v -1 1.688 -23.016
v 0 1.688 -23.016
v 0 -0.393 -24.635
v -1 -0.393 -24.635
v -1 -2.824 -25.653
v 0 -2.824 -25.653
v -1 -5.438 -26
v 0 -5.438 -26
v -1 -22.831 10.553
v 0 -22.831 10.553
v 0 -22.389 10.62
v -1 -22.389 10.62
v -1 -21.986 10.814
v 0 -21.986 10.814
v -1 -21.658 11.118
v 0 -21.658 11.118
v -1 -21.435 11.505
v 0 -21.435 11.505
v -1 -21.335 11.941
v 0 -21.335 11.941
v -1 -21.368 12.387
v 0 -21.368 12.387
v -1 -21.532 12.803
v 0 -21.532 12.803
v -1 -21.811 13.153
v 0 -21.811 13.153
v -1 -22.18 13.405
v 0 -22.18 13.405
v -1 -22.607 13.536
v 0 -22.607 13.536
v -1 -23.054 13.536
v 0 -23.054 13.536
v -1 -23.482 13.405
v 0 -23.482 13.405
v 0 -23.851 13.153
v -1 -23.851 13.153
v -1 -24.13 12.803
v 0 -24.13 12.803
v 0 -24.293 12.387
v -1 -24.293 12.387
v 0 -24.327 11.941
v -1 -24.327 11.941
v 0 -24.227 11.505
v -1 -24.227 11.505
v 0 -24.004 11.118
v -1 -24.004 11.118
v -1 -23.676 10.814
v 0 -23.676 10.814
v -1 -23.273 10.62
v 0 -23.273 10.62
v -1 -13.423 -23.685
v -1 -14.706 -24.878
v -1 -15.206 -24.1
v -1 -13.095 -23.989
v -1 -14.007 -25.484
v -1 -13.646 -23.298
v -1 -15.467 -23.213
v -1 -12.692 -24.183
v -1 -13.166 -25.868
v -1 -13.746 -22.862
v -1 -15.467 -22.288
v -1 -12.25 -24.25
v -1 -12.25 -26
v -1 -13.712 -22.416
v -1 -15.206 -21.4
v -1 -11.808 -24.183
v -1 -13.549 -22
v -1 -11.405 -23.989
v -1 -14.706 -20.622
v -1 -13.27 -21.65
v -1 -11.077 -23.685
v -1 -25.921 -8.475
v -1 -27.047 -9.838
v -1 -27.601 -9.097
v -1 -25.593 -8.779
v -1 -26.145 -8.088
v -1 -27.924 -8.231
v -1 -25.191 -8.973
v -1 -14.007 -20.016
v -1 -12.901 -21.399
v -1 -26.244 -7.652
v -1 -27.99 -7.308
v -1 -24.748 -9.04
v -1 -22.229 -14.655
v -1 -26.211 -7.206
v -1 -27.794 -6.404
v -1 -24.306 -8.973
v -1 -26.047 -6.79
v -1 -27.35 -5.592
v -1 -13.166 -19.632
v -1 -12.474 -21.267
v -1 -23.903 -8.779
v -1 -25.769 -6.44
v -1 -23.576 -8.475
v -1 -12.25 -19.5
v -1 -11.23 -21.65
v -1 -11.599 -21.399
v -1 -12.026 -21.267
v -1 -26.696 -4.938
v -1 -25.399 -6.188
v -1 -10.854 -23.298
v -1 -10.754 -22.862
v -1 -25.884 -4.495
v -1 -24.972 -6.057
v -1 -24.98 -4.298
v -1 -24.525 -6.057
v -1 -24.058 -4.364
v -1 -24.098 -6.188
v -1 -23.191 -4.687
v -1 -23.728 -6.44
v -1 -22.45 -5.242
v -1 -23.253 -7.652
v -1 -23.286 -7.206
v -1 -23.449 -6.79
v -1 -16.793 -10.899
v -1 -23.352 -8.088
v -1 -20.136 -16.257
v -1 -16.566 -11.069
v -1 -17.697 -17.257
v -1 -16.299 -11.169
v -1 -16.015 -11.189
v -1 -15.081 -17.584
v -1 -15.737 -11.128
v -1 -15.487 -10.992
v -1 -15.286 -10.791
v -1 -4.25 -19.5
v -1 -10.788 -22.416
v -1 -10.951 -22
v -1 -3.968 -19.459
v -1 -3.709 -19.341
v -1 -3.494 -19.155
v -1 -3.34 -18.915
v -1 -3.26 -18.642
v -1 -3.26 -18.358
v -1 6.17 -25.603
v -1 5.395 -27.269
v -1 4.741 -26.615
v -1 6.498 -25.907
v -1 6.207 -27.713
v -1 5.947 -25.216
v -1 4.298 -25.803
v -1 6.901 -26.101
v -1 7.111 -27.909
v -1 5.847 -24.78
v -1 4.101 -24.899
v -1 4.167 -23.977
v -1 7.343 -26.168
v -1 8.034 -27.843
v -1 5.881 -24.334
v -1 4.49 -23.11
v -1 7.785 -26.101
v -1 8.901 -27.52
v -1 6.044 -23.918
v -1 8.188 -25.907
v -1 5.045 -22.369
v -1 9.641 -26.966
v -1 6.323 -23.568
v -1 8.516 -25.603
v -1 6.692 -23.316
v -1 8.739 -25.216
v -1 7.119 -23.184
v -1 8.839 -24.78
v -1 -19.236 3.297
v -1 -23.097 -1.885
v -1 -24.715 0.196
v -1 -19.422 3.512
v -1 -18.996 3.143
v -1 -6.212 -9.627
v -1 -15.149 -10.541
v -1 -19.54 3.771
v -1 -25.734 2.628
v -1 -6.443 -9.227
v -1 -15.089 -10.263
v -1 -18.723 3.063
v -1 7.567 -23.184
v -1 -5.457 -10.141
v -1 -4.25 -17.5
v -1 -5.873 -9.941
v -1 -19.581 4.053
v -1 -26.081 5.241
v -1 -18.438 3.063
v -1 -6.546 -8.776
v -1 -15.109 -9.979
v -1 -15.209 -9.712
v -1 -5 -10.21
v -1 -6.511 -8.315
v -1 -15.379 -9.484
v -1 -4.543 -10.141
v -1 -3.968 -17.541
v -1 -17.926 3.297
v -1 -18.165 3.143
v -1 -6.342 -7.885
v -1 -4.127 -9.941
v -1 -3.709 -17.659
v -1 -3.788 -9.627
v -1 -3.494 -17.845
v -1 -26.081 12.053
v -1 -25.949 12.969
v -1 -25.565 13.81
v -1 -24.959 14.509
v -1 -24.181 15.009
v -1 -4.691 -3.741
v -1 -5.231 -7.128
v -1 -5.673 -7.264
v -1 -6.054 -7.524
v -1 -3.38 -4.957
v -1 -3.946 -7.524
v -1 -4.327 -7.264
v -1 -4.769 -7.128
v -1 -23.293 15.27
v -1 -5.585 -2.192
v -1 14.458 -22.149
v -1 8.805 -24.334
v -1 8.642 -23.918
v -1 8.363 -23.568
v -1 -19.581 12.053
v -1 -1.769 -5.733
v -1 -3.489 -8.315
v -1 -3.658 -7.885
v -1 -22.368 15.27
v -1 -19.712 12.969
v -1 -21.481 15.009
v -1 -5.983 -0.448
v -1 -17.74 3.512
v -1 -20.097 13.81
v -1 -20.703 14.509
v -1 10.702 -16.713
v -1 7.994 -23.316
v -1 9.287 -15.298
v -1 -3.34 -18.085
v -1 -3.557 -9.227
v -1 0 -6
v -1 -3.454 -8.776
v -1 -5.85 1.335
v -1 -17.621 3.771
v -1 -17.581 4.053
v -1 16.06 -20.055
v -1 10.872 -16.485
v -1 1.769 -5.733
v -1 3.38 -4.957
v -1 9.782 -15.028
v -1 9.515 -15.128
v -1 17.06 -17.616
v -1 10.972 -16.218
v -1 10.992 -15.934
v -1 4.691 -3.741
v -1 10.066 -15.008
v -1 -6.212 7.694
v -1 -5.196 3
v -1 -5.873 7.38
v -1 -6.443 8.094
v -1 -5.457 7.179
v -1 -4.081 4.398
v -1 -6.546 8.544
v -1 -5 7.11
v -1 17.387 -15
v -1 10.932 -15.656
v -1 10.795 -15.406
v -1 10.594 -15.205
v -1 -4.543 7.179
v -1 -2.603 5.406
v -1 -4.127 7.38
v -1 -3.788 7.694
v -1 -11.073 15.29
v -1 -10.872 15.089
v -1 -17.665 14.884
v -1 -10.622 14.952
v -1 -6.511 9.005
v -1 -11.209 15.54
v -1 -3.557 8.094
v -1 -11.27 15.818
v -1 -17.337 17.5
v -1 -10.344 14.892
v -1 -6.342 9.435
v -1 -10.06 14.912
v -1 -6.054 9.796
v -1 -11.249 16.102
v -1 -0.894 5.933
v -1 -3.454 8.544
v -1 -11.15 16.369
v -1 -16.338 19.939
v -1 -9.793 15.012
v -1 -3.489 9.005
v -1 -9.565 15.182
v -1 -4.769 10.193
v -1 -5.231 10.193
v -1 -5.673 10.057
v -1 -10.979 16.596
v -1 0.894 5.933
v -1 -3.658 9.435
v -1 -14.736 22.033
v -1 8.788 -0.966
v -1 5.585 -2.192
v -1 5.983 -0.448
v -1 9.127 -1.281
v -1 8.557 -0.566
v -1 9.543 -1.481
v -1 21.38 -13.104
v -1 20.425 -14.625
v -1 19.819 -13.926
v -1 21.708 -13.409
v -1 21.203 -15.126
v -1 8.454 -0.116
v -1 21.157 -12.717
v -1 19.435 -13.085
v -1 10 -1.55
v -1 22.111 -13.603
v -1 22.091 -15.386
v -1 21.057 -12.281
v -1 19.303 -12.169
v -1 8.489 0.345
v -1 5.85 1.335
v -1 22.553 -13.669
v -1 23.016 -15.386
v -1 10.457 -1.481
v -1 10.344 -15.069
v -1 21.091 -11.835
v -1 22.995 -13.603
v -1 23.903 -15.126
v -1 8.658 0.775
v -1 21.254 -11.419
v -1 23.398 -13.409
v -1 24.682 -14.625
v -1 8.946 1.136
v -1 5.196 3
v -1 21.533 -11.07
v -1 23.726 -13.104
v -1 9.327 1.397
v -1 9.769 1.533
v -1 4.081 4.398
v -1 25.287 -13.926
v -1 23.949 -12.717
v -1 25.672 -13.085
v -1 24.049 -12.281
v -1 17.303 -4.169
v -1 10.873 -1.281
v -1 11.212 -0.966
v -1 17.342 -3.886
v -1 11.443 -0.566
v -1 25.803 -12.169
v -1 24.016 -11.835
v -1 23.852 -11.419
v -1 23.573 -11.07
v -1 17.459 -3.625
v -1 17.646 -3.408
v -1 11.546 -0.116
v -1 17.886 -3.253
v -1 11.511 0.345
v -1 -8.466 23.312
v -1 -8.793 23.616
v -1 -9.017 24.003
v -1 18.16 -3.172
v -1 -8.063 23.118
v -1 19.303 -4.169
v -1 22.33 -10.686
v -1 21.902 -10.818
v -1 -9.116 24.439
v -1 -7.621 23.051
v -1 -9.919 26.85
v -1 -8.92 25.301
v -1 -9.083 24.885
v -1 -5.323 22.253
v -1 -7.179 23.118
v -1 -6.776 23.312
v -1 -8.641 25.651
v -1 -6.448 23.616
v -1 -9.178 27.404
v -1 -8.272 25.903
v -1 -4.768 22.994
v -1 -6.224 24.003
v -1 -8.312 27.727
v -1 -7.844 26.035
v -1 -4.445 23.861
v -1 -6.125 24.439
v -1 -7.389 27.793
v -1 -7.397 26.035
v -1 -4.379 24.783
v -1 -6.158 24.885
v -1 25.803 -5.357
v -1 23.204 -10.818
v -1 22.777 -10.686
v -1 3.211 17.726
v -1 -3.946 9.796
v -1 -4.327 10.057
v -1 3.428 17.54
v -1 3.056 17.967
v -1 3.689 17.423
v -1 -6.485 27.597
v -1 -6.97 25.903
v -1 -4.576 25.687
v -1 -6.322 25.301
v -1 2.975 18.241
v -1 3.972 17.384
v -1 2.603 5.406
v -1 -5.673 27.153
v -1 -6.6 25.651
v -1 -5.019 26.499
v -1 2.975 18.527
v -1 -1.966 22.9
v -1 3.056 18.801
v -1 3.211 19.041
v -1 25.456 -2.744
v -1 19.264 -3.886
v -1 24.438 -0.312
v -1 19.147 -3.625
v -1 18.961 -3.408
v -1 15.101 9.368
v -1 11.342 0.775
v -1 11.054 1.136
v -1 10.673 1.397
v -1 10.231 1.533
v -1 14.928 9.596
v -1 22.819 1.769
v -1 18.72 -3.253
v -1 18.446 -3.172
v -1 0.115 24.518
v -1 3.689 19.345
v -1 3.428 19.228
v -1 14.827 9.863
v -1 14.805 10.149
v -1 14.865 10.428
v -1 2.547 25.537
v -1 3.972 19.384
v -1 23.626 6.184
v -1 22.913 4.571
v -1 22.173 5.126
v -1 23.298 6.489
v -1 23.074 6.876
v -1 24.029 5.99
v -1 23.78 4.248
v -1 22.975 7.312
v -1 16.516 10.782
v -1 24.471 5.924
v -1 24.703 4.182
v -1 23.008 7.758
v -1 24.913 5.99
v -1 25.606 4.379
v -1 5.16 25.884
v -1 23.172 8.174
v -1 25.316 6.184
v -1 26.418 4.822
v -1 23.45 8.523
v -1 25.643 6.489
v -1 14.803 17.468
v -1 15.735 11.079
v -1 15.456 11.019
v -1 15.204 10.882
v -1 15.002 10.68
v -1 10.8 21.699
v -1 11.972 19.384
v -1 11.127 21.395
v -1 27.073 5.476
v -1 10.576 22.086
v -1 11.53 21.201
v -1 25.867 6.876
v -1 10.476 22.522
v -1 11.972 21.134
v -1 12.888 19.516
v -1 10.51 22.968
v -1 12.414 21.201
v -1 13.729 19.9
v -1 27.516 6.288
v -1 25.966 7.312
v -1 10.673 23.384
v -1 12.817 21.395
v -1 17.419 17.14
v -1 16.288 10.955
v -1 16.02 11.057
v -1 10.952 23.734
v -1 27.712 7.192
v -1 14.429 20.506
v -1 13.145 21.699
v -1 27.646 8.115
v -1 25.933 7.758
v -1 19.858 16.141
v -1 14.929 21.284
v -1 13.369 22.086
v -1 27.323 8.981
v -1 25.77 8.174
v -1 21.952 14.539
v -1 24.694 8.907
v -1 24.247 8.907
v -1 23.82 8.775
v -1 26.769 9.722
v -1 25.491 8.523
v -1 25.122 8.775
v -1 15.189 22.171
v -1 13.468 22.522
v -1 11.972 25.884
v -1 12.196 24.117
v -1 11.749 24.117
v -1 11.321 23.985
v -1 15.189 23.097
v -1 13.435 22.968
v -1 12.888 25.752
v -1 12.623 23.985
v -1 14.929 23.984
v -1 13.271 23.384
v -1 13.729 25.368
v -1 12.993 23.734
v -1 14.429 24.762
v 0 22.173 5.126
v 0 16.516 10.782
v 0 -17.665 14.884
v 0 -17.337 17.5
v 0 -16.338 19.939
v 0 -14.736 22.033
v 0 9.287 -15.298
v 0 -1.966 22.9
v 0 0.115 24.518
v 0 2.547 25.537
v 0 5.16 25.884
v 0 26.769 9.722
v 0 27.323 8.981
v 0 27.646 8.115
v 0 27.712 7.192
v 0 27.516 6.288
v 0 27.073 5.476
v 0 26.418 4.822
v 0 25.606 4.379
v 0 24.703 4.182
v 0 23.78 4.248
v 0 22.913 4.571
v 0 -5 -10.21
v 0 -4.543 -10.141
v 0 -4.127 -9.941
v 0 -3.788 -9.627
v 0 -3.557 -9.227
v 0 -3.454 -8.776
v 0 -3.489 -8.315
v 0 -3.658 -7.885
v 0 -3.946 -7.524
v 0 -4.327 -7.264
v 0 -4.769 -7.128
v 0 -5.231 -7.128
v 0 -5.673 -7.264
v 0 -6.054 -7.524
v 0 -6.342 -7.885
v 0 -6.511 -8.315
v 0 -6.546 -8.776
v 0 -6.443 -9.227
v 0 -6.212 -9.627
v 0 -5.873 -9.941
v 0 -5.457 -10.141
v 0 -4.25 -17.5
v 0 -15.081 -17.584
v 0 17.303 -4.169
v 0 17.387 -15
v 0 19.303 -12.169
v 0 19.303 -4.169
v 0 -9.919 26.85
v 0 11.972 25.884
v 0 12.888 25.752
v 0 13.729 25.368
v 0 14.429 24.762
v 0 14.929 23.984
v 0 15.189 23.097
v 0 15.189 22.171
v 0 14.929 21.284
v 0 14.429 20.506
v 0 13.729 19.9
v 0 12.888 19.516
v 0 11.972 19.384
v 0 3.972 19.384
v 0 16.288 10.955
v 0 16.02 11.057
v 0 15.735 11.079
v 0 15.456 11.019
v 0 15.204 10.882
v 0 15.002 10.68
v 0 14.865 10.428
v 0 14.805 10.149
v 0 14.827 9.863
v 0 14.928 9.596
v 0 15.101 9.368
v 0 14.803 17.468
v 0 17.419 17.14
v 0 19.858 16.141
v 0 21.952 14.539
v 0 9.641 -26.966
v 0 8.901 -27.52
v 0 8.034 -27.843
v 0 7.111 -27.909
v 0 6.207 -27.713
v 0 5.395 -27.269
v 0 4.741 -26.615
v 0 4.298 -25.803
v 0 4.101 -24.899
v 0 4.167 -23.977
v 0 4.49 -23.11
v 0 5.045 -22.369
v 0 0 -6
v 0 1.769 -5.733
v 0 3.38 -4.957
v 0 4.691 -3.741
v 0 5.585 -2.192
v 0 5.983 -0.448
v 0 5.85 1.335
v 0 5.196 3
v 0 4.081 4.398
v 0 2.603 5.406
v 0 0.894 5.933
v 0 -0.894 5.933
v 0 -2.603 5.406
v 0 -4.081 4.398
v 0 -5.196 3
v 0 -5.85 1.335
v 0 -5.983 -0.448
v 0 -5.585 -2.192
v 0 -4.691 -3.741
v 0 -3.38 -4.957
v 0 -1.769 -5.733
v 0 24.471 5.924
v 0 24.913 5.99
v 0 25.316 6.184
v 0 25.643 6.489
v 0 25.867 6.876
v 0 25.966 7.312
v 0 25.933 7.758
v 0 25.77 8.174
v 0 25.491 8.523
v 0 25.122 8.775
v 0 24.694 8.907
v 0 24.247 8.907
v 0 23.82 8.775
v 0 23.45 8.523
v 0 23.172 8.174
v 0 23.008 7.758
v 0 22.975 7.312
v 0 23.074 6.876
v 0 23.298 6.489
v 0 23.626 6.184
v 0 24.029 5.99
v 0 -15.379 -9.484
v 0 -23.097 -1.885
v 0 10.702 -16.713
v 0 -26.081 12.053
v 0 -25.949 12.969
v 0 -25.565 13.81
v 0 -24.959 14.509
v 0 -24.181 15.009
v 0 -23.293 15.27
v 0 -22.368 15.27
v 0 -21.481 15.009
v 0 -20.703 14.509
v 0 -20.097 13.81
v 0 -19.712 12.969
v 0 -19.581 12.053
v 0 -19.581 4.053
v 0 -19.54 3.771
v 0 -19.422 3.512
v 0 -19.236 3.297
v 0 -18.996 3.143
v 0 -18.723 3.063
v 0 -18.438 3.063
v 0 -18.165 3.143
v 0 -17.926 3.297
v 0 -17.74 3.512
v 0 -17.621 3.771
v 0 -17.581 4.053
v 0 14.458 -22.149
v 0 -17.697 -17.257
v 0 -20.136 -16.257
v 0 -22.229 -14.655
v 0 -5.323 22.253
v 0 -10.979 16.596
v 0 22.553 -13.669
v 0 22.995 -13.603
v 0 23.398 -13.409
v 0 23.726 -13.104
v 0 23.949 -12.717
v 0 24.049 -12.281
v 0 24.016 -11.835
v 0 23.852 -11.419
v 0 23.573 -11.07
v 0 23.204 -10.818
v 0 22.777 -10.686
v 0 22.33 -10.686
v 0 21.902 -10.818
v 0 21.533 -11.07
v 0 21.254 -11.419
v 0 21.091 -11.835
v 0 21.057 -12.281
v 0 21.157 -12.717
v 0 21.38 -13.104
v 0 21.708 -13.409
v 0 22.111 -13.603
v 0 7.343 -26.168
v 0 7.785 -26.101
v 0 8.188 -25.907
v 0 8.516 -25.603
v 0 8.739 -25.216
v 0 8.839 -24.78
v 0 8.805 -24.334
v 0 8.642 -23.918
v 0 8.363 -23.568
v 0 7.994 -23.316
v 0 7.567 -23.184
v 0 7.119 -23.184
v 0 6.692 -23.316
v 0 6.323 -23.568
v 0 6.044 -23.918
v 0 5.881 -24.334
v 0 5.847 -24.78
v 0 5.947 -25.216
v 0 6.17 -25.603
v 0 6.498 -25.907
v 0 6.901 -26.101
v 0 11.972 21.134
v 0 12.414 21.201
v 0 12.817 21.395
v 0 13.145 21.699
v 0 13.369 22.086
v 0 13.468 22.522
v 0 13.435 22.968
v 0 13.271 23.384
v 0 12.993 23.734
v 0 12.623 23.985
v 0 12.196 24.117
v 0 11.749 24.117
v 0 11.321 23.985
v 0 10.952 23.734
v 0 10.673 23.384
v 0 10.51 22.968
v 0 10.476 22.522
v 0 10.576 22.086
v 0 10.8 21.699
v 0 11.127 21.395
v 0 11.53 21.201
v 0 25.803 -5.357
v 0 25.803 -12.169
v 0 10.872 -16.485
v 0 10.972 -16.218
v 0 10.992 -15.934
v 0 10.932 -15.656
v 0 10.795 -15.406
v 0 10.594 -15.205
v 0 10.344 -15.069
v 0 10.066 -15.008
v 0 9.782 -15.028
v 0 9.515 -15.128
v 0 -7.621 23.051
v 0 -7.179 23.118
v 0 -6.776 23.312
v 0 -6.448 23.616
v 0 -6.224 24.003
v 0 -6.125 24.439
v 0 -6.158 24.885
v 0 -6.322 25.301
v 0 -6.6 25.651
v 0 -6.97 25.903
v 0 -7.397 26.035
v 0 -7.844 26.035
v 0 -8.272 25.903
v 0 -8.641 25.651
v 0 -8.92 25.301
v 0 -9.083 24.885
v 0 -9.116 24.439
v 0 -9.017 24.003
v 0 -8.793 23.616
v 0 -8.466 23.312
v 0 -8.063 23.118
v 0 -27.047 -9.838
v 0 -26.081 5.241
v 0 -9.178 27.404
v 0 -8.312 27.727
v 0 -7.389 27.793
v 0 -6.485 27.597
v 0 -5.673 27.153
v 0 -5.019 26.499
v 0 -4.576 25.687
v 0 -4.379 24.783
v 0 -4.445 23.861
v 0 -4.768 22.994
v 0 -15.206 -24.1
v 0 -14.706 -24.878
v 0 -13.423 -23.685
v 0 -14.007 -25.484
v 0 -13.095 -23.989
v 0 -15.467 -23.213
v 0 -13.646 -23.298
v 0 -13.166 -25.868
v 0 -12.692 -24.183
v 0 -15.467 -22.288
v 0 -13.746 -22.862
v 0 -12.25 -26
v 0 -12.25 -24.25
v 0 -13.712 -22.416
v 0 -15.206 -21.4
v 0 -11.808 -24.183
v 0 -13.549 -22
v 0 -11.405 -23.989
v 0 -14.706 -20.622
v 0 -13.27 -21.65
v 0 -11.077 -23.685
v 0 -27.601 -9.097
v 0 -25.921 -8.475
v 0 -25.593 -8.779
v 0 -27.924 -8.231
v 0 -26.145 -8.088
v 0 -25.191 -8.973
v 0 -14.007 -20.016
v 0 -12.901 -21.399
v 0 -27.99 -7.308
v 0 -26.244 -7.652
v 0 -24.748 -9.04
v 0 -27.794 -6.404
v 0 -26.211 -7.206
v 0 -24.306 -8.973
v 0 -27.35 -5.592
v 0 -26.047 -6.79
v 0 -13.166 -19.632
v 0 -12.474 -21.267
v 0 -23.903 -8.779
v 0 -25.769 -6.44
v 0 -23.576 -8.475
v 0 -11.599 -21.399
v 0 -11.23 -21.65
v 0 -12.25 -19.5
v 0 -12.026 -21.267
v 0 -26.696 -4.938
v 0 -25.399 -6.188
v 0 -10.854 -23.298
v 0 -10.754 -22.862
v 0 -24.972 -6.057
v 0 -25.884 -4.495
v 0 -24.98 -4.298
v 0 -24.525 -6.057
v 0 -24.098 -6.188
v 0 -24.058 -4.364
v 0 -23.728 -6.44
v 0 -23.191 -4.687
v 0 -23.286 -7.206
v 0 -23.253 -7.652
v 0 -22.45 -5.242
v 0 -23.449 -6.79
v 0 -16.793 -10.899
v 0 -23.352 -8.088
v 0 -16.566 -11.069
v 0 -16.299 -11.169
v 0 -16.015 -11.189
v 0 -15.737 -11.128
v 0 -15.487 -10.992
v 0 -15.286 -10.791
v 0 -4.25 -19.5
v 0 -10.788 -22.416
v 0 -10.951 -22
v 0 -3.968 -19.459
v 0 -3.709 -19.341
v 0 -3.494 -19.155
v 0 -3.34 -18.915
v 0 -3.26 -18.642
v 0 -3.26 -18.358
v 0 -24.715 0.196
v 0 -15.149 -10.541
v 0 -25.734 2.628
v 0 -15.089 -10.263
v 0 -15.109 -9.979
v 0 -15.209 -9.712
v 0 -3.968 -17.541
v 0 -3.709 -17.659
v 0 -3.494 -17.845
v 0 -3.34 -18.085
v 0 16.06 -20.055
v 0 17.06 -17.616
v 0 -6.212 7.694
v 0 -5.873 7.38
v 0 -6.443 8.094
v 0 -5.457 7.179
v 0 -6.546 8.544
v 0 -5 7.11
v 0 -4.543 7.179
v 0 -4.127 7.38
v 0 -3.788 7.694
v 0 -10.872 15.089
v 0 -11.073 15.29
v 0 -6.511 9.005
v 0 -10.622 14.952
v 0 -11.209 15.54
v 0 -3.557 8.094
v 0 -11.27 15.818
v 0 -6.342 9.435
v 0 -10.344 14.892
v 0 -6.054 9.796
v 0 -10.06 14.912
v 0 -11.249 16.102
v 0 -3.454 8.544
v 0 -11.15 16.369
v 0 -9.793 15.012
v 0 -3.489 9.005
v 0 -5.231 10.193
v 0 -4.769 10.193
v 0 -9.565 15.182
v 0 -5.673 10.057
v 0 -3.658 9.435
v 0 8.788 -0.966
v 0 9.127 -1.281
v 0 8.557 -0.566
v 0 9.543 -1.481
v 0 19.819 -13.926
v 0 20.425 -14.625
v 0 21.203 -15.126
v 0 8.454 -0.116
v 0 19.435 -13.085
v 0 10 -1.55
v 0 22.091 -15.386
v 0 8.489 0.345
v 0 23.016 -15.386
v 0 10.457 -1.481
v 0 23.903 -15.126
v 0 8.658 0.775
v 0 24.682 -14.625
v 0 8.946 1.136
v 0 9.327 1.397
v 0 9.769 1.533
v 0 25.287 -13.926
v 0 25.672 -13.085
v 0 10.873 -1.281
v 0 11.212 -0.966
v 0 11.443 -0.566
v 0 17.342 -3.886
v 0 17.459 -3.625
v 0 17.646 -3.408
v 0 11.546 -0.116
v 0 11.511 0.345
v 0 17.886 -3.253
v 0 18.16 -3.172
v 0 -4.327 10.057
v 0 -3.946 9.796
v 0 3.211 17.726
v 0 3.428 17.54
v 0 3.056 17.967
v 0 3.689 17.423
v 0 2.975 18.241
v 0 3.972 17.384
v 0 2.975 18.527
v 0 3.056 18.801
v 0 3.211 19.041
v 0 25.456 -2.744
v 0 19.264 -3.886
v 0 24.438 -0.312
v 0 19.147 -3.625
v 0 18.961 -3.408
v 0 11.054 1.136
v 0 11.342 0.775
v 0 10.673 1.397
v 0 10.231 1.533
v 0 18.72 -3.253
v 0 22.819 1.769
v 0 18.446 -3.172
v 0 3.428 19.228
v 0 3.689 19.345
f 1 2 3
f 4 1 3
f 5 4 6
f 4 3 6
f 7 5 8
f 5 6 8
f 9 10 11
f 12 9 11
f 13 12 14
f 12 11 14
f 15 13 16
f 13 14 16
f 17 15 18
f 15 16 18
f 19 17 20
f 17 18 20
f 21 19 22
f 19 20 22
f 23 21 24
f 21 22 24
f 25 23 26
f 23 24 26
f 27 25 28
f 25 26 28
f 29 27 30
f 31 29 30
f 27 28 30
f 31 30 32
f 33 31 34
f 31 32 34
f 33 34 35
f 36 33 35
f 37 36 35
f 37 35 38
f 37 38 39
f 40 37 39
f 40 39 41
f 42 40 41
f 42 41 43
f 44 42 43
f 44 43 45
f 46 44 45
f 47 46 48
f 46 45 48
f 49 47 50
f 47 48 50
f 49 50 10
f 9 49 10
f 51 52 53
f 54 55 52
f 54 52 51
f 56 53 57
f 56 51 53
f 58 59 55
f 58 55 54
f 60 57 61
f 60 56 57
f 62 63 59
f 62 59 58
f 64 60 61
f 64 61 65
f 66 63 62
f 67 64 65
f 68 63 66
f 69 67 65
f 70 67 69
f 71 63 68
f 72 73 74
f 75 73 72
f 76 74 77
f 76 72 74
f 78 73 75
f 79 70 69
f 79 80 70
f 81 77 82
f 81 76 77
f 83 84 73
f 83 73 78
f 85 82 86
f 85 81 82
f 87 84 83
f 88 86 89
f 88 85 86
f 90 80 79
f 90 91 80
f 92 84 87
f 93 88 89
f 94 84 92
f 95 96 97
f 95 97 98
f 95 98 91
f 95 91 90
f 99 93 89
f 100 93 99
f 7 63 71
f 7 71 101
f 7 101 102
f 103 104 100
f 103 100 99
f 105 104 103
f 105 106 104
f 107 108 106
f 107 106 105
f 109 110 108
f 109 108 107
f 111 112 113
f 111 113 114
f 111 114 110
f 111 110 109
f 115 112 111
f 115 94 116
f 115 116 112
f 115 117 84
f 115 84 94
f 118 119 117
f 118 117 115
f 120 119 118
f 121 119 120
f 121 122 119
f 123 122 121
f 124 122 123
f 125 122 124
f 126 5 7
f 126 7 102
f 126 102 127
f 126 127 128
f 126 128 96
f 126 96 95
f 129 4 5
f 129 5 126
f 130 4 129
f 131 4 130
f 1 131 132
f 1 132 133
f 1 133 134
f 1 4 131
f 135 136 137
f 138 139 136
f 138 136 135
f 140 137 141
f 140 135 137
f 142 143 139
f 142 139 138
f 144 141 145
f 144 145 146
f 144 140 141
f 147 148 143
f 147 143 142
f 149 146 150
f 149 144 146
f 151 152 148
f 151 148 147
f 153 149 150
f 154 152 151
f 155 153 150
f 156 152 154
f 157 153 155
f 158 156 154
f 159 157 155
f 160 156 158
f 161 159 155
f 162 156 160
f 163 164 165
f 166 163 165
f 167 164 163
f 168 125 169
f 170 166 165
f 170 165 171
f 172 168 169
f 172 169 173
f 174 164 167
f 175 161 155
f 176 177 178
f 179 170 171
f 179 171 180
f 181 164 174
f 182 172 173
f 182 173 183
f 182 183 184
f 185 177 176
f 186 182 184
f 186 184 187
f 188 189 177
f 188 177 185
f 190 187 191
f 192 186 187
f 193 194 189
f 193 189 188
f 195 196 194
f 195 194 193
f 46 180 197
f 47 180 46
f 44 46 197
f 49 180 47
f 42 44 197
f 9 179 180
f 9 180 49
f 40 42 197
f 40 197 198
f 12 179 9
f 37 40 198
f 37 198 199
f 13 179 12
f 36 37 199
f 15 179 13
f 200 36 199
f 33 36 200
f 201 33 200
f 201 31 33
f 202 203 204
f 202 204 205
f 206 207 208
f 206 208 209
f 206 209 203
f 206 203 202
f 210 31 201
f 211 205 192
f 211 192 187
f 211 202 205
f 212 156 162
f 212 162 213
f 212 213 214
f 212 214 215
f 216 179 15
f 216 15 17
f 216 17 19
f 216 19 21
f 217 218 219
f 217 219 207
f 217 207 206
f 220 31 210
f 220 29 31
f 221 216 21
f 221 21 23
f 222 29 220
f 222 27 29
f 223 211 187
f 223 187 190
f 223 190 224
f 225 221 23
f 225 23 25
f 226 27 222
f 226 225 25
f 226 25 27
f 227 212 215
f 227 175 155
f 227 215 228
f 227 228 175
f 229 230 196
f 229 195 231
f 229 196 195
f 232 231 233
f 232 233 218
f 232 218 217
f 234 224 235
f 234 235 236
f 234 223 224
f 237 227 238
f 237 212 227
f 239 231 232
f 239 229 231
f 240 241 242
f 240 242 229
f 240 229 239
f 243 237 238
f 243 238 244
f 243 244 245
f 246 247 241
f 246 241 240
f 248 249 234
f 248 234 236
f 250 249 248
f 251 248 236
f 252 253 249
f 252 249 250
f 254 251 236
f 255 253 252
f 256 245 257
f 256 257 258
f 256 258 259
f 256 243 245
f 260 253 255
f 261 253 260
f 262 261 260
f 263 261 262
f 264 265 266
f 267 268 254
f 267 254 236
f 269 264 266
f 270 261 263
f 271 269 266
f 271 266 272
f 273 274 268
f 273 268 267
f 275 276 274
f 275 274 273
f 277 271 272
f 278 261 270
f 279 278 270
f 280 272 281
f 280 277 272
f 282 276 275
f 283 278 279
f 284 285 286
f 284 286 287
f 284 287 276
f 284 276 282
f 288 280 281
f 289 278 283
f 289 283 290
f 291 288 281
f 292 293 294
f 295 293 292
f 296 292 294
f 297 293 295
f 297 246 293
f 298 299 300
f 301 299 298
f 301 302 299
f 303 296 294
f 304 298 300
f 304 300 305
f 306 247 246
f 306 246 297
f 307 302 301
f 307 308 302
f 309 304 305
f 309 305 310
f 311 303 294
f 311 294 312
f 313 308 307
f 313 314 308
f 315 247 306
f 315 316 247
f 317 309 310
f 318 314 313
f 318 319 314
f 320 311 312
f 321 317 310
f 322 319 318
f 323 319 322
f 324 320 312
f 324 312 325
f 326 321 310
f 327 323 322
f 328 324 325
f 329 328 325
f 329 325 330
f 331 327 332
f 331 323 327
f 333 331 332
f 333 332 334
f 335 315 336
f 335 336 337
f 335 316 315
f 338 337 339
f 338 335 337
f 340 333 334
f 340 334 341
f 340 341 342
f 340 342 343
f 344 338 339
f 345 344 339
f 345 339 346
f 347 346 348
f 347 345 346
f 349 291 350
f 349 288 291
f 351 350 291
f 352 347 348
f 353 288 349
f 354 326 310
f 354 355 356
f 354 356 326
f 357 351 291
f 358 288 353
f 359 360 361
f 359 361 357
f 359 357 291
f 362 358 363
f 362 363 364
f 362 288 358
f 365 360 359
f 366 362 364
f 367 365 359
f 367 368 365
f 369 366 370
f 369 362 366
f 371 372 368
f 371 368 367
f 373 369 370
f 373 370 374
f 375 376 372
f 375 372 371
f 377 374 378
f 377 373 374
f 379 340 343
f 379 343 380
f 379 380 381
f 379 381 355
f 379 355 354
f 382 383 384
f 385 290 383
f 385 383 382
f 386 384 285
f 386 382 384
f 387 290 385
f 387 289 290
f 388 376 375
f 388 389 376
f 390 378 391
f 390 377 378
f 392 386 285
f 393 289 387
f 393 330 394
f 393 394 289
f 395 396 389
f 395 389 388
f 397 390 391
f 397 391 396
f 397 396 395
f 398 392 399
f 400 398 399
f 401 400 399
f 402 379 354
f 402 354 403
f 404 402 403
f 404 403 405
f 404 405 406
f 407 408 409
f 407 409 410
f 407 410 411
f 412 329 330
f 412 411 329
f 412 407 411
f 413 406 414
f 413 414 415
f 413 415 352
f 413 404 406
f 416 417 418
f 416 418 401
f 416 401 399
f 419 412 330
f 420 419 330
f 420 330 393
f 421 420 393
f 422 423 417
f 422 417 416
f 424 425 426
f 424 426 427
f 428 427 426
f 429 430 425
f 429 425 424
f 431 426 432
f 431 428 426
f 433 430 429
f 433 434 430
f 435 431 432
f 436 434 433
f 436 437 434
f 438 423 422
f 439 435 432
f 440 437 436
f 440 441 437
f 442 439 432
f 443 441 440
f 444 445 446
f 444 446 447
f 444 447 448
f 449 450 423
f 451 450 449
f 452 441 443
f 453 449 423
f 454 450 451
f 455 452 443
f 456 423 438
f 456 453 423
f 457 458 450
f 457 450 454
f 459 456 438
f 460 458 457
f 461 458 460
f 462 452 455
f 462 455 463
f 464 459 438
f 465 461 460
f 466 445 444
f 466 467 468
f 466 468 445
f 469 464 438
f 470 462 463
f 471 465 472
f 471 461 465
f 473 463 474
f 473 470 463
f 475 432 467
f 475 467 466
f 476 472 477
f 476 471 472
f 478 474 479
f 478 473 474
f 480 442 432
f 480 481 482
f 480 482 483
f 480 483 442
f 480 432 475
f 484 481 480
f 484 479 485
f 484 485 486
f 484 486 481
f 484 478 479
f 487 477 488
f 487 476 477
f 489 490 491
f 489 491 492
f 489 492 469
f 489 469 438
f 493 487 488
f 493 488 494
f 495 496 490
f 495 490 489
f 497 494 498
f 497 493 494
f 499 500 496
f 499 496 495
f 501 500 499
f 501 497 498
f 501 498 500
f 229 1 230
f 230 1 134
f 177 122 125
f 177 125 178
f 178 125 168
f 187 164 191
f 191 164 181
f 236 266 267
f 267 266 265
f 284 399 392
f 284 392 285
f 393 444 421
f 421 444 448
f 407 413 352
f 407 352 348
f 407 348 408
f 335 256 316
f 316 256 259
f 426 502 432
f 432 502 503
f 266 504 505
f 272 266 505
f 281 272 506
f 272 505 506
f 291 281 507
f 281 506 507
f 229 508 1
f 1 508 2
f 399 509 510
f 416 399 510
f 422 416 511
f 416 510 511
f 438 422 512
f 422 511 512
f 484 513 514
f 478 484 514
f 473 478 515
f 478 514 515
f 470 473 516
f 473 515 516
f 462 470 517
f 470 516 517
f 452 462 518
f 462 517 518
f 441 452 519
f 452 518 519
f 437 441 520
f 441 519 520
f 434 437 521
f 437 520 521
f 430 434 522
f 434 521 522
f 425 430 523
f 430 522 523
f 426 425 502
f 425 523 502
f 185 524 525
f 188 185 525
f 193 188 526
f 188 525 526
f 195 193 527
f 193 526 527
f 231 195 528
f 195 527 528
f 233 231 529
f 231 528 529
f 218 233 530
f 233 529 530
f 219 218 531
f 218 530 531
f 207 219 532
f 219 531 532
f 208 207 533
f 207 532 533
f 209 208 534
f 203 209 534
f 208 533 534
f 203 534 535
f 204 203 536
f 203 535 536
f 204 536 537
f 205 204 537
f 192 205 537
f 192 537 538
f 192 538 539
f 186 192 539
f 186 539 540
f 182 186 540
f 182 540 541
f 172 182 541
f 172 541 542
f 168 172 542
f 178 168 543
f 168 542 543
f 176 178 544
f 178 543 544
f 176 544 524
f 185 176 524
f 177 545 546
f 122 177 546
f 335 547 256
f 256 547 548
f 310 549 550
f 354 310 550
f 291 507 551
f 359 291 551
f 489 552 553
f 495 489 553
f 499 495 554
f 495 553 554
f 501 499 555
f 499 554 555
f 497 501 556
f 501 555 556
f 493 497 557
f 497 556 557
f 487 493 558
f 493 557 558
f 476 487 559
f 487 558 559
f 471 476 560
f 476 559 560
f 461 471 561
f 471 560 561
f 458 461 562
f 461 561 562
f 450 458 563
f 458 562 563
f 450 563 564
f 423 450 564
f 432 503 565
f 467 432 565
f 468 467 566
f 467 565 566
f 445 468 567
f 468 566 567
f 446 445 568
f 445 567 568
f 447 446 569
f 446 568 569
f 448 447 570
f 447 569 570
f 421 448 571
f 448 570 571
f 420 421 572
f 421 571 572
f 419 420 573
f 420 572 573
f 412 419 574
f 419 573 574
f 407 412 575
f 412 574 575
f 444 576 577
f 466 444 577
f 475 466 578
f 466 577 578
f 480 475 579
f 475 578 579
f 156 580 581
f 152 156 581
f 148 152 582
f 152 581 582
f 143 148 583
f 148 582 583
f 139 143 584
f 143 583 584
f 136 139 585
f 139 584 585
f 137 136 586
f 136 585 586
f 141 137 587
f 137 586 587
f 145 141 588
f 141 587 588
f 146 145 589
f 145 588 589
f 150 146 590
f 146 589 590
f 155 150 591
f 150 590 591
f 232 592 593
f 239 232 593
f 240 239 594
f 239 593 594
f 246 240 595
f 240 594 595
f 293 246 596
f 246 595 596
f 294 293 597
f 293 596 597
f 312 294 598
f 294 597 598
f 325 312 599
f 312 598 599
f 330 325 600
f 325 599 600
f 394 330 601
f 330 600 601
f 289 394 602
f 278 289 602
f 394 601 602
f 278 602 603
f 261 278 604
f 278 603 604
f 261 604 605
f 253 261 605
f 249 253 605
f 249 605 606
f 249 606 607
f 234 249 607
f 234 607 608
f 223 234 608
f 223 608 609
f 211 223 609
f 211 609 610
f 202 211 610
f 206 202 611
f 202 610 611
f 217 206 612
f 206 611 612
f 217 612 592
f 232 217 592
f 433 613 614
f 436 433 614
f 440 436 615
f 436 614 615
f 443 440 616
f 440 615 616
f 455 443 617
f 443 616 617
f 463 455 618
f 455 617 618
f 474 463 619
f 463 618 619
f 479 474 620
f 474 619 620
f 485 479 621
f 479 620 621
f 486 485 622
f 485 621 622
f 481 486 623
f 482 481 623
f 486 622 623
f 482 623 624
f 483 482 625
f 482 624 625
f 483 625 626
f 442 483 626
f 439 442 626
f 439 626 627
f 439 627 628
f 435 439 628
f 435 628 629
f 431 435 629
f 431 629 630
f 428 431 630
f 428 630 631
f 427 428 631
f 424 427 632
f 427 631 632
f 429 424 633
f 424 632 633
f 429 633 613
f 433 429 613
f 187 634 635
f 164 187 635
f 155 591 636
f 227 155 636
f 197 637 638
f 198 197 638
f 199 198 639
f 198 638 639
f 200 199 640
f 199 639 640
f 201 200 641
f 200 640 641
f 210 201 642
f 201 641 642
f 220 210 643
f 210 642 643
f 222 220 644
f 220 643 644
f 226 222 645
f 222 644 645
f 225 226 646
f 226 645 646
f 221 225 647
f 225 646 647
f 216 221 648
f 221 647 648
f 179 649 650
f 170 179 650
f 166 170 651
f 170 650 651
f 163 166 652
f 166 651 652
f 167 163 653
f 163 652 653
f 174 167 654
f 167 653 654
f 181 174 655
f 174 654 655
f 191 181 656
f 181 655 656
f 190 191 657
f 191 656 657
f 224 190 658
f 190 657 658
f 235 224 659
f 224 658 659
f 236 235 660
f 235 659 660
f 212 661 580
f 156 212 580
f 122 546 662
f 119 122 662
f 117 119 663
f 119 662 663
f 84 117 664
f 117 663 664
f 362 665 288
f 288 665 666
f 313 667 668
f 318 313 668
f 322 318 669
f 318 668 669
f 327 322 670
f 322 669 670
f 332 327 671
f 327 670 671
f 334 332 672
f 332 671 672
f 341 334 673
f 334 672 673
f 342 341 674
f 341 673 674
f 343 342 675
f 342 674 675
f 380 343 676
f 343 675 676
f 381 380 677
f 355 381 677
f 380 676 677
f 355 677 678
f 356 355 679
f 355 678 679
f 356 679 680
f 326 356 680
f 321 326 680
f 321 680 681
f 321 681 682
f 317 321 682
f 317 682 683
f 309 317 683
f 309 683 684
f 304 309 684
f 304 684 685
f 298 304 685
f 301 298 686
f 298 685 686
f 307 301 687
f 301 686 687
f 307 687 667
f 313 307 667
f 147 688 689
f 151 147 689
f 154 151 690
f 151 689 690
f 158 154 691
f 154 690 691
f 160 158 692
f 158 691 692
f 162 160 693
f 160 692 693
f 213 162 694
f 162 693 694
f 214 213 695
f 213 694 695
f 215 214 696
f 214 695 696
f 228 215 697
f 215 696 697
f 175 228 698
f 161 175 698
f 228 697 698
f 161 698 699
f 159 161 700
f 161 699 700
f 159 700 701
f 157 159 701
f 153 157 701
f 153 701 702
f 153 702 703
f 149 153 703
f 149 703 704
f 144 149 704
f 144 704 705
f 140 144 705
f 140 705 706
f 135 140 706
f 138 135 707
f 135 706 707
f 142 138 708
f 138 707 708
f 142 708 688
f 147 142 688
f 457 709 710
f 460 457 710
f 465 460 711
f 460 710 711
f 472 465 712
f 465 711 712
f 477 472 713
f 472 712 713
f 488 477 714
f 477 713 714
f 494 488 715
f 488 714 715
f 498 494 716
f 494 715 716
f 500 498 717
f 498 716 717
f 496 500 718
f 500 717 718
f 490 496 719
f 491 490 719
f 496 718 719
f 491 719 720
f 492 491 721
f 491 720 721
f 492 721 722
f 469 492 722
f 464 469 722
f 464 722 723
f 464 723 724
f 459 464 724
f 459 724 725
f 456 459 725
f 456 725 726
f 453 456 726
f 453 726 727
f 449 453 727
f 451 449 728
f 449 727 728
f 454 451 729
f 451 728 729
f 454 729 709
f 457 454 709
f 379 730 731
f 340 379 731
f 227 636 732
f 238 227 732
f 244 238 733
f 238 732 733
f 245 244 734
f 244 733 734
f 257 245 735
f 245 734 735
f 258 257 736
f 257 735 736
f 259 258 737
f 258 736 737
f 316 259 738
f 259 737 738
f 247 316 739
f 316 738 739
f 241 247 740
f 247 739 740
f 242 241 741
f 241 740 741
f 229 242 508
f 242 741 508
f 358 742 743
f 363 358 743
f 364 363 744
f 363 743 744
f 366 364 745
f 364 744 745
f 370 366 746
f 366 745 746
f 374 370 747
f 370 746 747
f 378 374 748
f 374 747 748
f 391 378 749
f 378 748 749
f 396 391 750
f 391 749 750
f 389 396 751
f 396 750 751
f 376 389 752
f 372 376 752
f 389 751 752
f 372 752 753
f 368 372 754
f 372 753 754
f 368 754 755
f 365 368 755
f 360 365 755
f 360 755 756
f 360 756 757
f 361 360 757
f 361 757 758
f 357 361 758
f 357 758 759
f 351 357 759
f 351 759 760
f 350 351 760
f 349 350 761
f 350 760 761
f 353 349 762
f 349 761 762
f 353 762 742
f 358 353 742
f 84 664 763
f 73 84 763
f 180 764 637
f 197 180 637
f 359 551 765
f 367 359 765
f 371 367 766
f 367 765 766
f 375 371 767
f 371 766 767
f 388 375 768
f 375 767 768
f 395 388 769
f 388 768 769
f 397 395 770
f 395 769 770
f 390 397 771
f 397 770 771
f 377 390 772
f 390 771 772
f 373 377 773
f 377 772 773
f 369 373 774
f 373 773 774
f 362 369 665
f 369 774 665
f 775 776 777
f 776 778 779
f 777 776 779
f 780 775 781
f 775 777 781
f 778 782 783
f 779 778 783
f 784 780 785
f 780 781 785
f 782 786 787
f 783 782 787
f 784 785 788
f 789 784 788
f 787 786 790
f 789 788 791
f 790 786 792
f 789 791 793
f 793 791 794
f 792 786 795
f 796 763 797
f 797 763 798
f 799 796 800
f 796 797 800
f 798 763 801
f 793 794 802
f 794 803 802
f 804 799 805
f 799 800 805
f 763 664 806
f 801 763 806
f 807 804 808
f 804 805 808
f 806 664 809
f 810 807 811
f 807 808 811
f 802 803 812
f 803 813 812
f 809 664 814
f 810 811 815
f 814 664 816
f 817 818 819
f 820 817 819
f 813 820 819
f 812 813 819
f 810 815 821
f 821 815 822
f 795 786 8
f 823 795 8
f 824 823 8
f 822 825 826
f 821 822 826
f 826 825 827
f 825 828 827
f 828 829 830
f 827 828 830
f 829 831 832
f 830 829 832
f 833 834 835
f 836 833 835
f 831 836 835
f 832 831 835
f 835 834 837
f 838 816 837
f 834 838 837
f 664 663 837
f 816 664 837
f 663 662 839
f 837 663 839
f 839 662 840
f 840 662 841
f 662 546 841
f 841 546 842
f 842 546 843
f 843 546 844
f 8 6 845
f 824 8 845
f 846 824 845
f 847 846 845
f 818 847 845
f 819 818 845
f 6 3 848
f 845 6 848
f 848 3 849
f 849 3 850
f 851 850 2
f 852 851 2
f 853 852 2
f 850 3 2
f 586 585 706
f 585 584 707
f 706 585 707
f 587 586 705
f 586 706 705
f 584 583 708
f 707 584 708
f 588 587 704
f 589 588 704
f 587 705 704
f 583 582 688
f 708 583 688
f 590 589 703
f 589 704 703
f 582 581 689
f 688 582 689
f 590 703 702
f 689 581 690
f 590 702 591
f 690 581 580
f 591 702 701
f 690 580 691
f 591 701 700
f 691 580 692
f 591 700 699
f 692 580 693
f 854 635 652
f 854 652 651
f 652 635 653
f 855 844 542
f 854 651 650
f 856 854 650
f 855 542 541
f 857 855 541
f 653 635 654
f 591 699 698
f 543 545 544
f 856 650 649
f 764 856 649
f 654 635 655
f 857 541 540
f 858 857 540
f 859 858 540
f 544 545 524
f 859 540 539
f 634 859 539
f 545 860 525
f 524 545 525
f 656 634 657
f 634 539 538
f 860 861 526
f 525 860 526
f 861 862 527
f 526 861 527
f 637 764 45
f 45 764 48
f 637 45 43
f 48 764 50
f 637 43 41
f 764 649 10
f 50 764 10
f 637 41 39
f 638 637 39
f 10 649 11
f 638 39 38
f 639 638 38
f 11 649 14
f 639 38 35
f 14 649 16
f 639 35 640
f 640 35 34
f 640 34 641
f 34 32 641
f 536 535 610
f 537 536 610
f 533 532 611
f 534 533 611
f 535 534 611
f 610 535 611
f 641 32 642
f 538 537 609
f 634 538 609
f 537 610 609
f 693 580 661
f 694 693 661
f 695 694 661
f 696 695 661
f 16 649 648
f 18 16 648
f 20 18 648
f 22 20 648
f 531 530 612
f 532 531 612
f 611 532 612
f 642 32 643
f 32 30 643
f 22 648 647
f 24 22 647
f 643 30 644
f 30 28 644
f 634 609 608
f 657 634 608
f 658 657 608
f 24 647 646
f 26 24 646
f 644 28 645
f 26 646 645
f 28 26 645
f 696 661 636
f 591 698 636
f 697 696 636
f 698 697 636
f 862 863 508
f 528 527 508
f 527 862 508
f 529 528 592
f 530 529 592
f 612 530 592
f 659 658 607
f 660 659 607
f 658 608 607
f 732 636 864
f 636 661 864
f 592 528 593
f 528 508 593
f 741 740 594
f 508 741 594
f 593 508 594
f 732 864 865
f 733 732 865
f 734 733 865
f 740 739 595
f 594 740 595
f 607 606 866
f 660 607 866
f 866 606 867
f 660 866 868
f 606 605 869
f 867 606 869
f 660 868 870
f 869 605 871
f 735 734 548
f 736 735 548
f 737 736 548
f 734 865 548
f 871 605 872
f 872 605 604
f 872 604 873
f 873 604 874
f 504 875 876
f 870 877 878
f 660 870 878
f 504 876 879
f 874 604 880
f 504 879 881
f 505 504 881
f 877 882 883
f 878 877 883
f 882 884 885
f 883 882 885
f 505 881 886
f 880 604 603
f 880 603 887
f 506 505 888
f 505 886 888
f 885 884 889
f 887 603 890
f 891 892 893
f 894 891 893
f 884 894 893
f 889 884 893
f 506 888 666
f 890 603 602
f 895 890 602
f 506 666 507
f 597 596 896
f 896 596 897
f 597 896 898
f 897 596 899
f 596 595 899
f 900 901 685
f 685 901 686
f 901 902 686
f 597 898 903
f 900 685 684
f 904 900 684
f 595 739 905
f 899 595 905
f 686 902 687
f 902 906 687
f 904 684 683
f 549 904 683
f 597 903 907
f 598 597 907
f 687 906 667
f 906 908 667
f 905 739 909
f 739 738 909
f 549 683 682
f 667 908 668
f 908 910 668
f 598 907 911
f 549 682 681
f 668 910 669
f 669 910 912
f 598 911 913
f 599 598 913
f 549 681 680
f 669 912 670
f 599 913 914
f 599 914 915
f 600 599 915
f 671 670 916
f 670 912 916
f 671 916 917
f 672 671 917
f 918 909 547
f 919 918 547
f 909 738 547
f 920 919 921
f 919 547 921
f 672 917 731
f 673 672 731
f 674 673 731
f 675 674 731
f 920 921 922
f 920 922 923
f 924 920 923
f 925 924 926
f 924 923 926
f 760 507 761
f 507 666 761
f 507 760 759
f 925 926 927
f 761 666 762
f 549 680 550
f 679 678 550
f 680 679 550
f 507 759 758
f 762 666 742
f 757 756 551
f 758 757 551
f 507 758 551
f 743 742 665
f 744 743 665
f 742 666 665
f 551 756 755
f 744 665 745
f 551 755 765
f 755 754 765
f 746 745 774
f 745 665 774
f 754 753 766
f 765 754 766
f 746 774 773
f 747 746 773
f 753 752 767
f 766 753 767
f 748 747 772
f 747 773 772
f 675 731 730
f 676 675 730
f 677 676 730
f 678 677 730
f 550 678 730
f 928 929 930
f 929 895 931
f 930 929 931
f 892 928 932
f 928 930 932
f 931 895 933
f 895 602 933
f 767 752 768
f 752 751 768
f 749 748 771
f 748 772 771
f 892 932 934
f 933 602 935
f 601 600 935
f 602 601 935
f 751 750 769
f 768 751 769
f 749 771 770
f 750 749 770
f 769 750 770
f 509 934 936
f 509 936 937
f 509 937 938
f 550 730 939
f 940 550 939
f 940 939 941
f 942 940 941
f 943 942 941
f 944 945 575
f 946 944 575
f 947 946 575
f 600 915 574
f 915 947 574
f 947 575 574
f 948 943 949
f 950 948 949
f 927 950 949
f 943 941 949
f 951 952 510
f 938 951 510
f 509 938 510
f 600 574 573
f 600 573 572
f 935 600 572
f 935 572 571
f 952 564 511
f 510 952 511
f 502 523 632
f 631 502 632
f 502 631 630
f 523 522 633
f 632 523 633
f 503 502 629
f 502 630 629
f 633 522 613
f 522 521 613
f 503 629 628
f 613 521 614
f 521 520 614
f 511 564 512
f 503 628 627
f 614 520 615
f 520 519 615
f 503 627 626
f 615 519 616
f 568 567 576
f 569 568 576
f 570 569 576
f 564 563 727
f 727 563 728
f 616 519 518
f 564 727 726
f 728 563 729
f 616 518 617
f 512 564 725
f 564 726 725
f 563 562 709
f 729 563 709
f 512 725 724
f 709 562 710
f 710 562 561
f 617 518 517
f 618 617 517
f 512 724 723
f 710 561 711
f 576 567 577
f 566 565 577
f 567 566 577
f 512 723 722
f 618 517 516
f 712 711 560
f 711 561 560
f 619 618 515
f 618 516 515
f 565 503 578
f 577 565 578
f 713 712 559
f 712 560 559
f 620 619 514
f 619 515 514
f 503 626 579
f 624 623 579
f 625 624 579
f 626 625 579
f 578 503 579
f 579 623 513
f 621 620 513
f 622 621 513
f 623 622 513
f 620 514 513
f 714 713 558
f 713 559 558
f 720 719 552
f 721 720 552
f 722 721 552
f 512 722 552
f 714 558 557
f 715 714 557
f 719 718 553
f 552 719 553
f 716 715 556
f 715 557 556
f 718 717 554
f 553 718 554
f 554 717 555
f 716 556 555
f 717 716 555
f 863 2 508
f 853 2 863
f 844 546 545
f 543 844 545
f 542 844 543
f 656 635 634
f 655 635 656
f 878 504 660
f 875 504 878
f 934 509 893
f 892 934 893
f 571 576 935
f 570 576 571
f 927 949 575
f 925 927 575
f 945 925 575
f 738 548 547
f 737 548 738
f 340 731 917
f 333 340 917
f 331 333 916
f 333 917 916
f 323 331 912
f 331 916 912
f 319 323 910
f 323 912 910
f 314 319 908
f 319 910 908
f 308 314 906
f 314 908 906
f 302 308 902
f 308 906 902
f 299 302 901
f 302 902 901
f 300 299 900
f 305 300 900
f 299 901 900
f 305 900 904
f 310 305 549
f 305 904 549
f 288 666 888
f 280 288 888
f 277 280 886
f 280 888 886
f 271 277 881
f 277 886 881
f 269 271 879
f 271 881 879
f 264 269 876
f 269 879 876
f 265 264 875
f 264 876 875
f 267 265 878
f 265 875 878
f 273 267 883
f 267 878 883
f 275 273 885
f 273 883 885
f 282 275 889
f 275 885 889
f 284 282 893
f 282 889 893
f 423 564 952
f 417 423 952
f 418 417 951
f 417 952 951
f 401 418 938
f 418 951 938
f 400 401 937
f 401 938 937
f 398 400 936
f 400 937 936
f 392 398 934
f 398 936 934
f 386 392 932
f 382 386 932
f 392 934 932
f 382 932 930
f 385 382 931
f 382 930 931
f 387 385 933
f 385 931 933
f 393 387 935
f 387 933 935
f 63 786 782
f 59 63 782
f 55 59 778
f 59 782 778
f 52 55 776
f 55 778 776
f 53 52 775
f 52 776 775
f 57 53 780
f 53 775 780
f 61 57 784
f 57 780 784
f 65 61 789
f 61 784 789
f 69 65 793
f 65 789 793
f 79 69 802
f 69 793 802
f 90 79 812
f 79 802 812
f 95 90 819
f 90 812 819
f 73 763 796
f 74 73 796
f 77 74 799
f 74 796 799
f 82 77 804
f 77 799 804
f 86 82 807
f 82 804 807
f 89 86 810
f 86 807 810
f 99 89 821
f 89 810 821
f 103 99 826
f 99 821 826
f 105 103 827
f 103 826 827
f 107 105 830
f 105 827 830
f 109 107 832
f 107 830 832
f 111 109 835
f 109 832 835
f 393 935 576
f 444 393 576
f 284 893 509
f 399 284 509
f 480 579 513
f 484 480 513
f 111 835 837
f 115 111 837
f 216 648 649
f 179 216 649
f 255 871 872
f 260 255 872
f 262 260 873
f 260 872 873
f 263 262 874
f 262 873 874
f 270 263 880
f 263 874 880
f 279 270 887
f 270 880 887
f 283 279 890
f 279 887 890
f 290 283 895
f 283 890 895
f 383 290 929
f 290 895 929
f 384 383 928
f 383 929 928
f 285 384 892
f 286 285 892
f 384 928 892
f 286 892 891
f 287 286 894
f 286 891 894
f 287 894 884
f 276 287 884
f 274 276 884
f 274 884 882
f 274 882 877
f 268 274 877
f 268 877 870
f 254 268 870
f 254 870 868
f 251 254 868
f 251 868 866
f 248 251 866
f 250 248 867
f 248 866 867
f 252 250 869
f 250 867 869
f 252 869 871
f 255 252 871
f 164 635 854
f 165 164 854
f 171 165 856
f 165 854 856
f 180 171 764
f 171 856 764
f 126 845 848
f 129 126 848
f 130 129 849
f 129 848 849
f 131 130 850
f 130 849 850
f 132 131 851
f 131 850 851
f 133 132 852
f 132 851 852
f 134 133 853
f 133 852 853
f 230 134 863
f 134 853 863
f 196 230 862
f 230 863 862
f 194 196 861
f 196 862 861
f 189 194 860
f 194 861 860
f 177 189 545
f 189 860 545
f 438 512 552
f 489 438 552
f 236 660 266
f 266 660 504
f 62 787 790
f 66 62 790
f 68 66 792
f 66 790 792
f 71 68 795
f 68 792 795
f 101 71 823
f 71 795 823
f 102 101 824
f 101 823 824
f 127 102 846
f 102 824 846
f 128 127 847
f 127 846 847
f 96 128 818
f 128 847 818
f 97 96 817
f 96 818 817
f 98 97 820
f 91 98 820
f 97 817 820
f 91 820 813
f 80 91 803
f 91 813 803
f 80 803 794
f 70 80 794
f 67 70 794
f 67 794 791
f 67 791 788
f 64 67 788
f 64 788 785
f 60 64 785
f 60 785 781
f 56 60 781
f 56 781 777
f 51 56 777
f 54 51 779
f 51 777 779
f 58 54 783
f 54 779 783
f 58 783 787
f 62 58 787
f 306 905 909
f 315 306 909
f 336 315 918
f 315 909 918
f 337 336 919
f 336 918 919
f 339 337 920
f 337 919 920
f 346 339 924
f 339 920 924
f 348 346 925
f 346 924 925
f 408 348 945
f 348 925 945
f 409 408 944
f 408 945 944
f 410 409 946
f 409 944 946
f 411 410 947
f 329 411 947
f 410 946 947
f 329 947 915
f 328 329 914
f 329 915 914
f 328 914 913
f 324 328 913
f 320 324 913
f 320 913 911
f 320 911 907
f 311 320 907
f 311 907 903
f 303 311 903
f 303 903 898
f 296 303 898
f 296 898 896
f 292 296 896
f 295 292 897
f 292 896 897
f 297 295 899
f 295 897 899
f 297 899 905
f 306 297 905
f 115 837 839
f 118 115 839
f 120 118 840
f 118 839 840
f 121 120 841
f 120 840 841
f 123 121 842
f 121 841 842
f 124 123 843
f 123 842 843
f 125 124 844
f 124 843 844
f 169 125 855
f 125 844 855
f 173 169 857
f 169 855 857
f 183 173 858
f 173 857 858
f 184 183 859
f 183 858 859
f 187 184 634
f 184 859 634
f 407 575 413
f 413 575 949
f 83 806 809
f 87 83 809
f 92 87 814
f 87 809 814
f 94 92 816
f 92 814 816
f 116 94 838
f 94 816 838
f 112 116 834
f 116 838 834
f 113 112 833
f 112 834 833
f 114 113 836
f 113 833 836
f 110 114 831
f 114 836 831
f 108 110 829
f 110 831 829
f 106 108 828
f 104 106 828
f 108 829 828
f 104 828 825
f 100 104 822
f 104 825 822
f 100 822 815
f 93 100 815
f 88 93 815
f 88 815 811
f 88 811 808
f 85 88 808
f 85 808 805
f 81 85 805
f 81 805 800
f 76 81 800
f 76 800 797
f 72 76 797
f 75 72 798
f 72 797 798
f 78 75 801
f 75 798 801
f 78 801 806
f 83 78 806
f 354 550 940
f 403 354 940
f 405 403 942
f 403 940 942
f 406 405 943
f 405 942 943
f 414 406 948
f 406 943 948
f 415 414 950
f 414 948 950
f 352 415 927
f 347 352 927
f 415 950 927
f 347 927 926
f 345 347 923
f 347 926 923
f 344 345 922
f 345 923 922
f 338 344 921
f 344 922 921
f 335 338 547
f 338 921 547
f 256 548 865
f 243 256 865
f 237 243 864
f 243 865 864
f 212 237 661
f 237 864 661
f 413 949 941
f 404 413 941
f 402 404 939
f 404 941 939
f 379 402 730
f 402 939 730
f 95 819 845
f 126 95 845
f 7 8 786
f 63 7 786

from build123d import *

# Parameters (mm, degrees)
SKETCH1_R          = 1.5
SKETCH1_R_2        = 6
SKETCH1_R_3        = 1.55
BASE_FLANGE1_DEPTH = 1


# Sheet-metal steps are written as plain solids
with BuildPart() as part:
    # Sketch1 → Base-Flange1 (new body)
    with BuildSketch(Plane(origin=(0, 0, 0), x_dir=(0, 0, -1), z_dir=(1, 0, 0))):
        with BuildLine():
            Line((15.298384889, 9.287443872), (23.016301233, 1.688033071))
            ThreePointArc((23.016301233, 1.688033071), (25.224073123, -1.574984432), (26.00015012, -5.437528209))
            Line((26.00015012, -5.437528209), (26.00015012, -12.25))
            ThreePointArc((26.00015012, -12.25), (22.75007506, -15.50007506), (19.5, -12.25))
            Line((19.5, -12.25), (19.5, -4.25))
            ThreePointArc((19.5, -4.25), (18.5, -3.25), (17.5, -4.25))
            Line((17.5, -4.25), (17.583796073, -15.080985895))
            ThreePointArc((17.583796073, -15.080985895), (16.837624745, -18.949418172), (14.655163154, -22.229418377))
            Line((14.655163154, -22.229418377), (9.838018154, -27.046563377))
            ThreePointArc((9.838018154, -27.046563377), (5.241717926, -27.046563377), (5.241717926, -22.450263149))
            Line((5.241717926, -22.450263149), (10.898572175, -16.793408899))
            ThreePointArc((10.898572175, -16.793408899), (10.898572175, -15.379195337), (9.484358613, -15.379195337))
            Line((9.484358613, -15.379195337), (1.884947812, -23.097111681))
            ThreePointArc((1.884947812, -23.097111681), (-1.378069691, -25.304883571), (-5.240613468, -26.080960568))
            Line((-5.240613468, -26.080960568), (-12.053085259, -26.080960568))
            ThreePointArc((-12.053085259, -26.080960568), (-15.303160319, -22.830885508), (-12.053085259, -19.580810448))
            Line((-12.053085259, -19.580810448), (-4.053085259, -19.580810448))
            ThreePointArc((-4.053085259, -19.580810448), (-3.053085259, -18.580810448), (-4.053085259, -17.580810448))
            Line((-4.053085259, -17.580810448), (-14.884071154, -17.664606521))
            ThreePointArc((-14.884071154, -17.664606521), (-18.752503431, -16.918435193), (-22.032503636, -14.735973602))
            Line((-22.032503636, -14.735973602), (-26.849648636, -9.918828602))
            ThreePointArc((-26.849648636, -9.918828602), (-26.849648636, -5.322528374), (-22.253348408, -5.322528374))
            Line((-22.253348408, -5.322528374), (-16.596494158, -10.979382623))
            ThreePointArc((-16.596494158, -10.979382623), (-15.182280596, -10.979382623), (-15.182280596, -9.565169061))
            Line((-15.182280596, -9.565169061), (-22.90019694, -1.96575826))
            ThreePointArc((-22.90019694, -1.96575826), (-25.10796883, 1.297259243), (-25.884045827, 5.15980302))
            Line((-25.884045827, 5.15980302), (-25.884045827, 11.972274811))
            ThreePointArc((-25.884045827, 11.972274811), (-22.633970767, 15.222349871), (-19.383895707, 11.972274811))
            Line((-19.383895707, 11.972274811), (-19.383895707, 3.972274811))
            ThreePointArc((-19.383895707, 3.972274811), (-18.383895707, 2.964508185), (-17.383895707, 3.972274811))
            Line((-17.383895707, 3.972274811), (-17.46769178, 14.803260706))
            ThreePointArc((-17.46769178, 14.803260706), (-16.721520452, 18.671692983), (-14.539058861, 21.951693188))
            Line((-14.539058861, 21.951693188), (-9.721913861, 26.768838188))
            ThreePointArc((-9.721913861, 26.768838188), (-5.125613633, 26.768838188), (-5.125613633, 22.17253796))
            Line((-5.125613633, 22.17253796), (-10.782467882, 16.51568371))
            ThreePointArc((-10.782467882, 16.51568371), (-10.787959717, 15.095978314), (-9.36825432, 15.101470148))
            Line((-9.36825432, 15.101470148), (-1.768843519, 22.819386492))
            ThreePointArc((-1.768843519, 22.819386492), (1.494173984, 25.027158382), (5.356717761, 25.803235379))
            Line((5.356717761, 25.803235379), (12.169189552, 25.803235379))
            ThreePointArc((12.169189552, 25.803235379), (15.419264612, 22.553160319), (12.169189552, 19.303085259))
            Line((12.169189552, 19.303085259), (4.169189552, 19.303085259))
            ThreePointArc((4.169189552, 19.303085259), (3.161422926, 18.303085259), (4.169189552, 17.303085259))
            Line((4.169189552, 17.303085259), (15.000175447, 17.386881332))
            ThreePointArc((15.000175447, 17.386881332), (18.868607724, 16.640710004), (22.148607929, 14.458248413))
            Line((22.148607929, 14.458248413), (26.965752929, 9.641103413))
            ThreePointArc((26.965752929, 9.641103413), (26.965752929, 5.044803185), (22.369452701, 5.044803185))
            Line((22.369452701, 5.044803185), (16.712598451, 10.701657434))
            ThreePointArc((16.712598451, 10.701657434), (15.298384889, 10.701657434), (15.298384889, 9.287443872))
        make_face()
        with Locations((22.75007506, -12.25)):
            Circle(SKETCH1_R, mode=Mode.SUBTRACT)
        with Locations((7.53986804, -24.748413263)):
            Circle(SKETCH1_R, mode=Mode.SUBTRACT)
        with Locations((-12.053085259, -22.830885508)):
            Circle(SKETCH1_R, mode=Mode.SUBTRACT)
        with Locations((-24.551498522, -7.620678488)):
            Circle(SKETCH1_R, mode=Mode.SUBTRACT)
        with Locations((-22.633970767, 11.972274811)):
            Circle(SKETCH1_R, mode=Mode.SUBTRACT)
        with Locations((-7.423763747, 24.470688074)):
            Circle(SKETCH1_R, mode=Mode.SUBTRACT)
        with Locations((12.169189552, 22.553160319)):
            Circle(SKETCH1_R, mode=Mode.SUBTRACT)
        with Locations((24.667602815, 7.342953299)):
            Circle(SKETCH1_R, mode=Mode.SUBTRACT)
        Circle(SKETCH1_R_2, mode=Mode.SUBTRACT)
        with Locations((0, 10)):
            Circle(SKETCH1_R_3, mode=Mode.SUBTRACT)
        with Locations((8.660254038, -5)):
            Circle(SKETCH1_R_3, mode=Mode.SUBTRACT)
        with Locations((-8.660254038, -5)):
            Circle(SKETCH1_R_3, mode=Mode.SUBTRACT)
    extrude(amount=-BASE_FLANGE1_DEPTH)


solid = part.part
